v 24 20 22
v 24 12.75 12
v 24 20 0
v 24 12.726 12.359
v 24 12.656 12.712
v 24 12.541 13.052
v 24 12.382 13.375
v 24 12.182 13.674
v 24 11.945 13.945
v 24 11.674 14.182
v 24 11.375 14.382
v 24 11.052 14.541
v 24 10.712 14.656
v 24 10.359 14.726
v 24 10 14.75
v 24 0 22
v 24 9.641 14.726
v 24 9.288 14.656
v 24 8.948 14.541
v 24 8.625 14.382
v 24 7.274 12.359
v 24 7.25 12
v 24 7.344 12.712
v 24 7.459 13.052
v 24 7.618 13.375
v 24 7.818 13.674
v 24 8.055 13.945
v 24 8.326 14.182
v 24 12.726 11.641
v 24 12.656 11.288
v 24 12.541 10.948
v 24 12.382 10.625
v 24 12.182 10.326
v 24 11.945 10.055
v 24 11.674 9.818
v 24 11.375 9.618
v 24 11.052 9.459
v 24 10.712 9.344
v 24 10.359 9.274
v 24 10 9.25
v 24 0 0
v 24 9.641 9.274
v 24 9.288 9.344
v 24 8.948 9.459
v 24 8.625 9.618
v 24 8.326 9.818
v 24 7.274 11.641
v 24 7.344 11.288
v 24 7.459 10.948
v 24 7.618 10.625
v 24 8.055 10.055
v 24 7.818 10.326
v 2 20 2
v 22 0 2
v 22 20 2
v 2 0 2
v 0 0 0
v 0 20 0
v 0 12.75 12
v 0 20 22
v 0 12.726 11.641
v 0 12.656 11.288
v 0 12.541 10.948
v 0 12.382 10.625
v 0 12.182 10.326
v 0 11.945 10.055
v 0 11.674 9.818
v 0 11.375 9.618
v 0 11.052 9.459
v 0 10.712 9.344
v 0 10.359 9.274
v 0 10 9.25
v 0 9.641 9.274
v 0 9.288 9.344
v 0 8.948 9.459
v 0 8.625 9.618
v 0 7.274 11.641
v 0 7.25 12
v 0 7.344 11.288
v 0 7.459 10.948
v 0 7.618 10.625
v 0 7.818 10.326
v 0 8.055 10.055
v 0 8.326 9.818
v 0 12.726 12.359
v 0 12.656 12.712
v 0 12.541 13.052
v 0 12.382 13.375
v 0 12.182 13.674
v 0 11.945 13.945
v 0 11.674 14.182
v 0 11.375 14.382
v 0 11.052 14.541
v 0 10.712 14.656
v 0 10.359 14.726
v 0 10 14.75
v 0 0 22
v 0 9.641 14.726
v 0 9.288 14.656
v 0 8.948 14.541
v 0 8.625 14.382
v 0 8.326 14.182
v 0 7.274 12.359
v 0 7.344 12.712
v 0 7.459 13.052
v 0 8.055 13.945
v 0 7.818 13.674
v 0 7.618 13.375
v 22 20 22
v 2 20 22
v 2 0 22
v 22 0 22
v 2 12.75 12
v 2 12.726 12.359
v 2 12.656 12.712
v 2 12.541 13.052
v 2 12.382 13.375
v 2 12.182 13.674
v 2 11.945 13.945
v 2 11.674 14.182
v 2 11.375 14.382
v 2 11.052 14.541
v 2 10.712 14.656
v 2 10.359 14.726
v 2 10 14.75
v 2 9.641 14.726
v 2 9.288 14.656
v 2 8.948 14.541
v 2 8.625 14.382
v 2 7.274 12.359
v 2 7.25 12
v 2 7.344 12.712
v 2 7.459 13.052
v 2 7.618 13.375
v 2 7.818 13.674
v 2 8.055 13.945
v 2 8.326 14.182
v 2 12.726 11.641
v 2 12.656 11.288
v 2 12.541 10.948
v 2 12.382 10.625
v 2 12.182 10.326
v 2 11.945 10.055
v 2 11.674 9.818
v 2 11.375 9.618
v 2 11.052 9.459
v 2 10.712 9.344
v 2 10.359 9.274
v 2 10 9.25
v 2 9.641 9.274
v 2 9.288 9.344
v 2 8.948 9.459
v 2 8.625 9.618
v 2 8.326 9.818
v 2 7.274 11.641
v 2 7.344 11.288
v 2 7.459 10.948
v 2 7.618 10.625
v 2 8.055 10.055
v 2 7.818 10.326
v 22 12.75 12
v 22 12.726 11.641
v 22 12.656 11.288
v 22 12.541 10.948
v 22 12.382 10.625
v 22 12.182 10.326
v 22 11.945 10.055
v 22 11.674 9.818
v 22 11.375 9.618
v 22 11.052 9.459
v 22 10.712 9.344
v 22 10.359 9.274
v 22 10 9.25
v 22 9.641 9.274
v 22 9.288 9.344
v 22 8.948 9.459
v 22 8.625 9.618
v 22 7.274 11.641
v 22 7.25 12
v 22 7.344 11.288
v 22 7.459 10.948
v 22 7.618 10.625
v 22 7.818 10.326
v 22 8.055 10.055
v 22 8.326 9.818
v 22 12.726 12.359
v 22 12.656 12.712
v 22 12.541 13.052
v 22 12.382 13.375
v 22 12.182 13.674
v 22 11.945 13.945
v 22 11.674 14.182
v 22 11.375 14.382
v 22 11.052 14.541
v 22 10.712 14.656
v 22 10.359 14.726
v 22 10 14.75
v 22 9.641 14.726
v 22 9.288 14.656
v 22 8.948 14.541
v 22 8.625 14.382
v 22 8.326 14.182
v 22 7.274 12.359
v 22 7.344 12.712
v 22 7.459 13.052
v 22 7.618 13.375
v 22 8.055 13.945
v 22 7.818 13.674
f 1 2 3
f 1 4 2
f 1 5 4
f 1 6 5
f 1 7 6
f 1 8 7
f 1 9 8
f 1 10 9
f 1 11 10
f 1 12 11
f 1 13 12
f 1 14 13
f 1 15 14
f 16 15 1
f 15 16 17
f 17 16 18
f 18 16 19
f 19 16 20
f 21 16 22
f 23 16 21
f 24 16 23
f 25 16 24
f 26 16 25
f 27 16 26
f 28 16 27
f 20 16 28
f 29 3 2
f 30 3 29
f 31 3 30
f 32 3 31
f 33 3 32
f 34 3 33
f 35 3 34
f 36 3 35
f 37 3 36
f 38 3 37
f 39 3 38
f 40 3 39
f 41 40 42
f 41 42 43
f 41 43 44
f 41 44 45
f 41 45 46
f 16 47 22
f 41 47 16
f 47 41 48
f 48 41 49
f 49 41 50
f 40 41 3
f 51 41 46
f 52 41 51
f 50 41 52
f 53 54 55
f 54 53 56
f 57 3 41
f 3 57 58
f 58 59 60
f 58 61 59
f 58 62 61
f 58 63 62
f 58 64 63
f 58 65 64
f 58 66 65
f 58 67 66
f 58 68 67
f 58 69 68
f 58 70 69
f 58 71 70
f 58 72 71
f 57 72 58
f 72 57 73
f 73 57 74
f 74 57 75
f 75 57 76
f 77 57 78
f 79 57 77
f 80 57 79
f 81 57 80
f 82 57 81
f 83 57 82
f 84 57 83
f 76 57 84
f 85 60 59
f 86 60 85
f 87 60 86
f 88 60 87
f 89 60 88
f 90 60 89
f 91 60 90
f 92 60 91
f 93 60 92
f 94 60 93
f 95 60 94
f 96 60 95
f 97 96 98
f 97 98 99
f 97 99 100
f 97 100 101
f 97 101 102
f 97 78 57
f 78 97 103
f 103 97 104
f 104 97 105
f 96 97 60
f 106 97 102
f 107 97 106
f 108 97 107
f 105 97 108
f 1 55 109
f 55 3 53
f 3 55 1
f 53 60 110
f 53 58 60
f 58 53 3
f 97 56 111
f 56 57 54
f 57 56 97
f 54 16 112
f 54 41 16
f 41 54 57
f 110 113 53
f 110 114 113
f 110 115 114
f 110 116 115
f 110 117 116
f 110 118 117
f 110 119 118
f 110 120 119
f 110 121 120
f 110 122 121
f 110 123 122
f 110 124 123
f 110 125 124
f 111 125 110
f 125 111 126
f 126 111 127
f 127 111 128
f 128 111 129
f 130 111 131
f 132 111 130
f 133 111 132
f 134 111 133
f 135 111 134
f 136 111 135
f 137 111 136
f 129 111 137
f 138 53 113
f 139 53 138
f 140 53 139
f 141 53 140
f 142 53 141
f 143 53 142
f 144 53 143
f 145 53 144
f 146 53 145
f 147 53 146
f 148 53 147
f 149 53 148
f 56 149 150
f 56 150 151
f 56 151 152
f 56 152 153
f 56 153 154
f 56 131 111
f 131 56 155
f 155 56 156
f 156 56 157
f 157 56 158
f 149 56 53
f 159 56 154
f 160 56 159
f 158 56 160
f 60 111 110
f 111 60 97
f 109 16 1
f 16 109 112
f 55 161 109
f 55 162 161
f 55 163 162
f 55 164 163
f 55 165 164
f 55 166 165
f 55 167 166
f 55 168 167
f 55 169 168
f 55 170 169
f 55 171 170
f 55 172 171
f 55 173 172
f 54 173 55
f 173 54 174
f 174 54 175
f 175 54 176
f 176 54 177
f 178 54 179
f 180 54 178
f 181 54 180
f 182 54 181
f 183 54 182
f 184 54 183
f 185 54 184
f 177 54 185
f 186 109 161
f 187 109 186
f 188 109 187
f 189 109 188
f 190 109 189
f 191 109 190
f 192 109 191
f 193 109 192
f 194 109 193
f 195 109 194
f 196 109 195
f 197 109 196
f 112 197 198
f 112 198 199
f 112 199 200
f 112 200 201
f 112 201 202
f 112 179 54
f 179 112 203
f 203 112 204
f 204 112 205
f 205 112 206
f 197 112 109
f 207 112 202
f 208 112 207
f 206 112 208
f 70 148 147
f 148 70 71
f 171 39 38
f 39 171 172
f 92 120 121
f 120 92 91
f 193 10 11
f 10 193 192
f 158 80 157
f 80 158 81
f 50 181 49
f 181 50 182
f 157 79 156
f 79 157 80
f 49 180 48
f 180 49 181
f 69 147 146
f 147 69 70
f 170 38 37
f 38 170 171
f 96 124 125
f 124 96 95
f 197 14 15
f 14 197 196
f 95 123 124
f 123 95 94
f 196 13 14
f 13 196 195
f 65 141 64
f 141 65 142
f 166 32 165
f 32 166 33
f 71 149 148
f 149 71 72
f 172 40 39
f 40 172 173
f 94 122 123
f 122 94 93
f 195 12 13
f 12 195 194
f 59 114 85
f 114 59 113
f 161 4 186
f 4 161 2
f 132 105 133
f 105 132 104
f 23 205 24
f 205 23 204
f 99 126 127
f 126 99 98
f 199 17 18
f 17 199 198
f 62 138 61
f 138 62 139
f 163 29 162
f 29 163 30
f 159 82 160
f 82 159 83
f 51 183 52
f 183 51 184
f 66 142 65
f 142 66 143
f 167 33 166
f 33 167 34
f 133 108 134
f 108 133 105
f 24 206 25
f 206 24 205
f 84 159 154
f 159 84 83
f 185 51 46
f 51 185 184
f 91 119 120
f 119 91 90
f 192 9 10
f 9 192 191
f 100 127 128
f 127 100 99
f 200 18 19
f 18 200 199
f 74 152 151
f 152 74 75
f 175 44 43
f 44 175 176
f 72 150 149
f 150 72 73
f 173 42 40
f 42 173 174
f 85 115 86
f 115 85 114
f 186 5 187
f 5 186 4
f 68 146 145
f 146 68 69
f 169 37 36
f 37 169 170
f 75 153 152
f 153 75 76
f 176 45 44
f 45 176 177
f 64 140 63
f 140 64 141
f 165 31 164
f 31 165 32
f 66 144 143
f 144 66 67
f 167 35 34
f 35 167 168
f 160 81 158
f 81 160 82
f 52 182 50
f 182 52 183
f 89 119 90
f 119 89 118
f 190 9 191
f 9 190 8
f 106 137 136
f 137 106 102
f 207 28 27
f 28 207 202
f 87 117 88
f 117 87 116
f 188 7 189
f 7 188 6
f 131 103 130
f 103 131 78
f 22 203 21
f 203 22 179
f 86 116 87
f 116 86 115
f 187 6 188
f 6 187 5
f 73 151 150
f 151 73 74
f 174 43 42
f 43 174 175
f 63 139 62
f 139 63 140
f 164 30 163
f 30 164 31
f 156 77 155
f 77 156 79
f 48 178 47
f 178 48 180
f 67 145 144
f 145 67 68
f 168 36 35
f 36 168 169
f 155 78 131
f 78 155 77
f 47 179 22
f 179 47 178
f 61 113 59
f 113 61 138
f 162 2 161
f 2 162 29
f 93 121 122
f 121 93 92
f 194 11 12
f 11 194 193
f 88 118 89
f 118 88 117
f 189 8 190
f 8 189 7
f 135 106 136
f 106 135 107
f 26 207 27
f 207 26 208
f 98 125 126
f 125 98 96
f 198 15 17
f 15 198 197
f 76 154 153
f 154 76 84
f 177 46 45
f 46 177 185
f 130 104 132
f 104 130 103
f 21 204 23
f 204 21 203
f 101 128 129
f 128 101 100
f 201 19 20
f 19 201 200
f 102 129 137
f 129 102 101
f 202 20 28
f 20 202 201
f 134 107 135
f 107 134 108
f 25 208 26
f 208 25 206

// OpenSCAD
difference()
{
    union()
    {
        cube([24,20,2]);
        
        cube([2,20,22]);
        
        translate([22,0,0])
            cube([2,20,22]);
    }
    union()
    {
        translate([0,10,12])
            rotate([0,90,0])
                cylinder(d=5.5,h=25,$fn=48);
    }
}
